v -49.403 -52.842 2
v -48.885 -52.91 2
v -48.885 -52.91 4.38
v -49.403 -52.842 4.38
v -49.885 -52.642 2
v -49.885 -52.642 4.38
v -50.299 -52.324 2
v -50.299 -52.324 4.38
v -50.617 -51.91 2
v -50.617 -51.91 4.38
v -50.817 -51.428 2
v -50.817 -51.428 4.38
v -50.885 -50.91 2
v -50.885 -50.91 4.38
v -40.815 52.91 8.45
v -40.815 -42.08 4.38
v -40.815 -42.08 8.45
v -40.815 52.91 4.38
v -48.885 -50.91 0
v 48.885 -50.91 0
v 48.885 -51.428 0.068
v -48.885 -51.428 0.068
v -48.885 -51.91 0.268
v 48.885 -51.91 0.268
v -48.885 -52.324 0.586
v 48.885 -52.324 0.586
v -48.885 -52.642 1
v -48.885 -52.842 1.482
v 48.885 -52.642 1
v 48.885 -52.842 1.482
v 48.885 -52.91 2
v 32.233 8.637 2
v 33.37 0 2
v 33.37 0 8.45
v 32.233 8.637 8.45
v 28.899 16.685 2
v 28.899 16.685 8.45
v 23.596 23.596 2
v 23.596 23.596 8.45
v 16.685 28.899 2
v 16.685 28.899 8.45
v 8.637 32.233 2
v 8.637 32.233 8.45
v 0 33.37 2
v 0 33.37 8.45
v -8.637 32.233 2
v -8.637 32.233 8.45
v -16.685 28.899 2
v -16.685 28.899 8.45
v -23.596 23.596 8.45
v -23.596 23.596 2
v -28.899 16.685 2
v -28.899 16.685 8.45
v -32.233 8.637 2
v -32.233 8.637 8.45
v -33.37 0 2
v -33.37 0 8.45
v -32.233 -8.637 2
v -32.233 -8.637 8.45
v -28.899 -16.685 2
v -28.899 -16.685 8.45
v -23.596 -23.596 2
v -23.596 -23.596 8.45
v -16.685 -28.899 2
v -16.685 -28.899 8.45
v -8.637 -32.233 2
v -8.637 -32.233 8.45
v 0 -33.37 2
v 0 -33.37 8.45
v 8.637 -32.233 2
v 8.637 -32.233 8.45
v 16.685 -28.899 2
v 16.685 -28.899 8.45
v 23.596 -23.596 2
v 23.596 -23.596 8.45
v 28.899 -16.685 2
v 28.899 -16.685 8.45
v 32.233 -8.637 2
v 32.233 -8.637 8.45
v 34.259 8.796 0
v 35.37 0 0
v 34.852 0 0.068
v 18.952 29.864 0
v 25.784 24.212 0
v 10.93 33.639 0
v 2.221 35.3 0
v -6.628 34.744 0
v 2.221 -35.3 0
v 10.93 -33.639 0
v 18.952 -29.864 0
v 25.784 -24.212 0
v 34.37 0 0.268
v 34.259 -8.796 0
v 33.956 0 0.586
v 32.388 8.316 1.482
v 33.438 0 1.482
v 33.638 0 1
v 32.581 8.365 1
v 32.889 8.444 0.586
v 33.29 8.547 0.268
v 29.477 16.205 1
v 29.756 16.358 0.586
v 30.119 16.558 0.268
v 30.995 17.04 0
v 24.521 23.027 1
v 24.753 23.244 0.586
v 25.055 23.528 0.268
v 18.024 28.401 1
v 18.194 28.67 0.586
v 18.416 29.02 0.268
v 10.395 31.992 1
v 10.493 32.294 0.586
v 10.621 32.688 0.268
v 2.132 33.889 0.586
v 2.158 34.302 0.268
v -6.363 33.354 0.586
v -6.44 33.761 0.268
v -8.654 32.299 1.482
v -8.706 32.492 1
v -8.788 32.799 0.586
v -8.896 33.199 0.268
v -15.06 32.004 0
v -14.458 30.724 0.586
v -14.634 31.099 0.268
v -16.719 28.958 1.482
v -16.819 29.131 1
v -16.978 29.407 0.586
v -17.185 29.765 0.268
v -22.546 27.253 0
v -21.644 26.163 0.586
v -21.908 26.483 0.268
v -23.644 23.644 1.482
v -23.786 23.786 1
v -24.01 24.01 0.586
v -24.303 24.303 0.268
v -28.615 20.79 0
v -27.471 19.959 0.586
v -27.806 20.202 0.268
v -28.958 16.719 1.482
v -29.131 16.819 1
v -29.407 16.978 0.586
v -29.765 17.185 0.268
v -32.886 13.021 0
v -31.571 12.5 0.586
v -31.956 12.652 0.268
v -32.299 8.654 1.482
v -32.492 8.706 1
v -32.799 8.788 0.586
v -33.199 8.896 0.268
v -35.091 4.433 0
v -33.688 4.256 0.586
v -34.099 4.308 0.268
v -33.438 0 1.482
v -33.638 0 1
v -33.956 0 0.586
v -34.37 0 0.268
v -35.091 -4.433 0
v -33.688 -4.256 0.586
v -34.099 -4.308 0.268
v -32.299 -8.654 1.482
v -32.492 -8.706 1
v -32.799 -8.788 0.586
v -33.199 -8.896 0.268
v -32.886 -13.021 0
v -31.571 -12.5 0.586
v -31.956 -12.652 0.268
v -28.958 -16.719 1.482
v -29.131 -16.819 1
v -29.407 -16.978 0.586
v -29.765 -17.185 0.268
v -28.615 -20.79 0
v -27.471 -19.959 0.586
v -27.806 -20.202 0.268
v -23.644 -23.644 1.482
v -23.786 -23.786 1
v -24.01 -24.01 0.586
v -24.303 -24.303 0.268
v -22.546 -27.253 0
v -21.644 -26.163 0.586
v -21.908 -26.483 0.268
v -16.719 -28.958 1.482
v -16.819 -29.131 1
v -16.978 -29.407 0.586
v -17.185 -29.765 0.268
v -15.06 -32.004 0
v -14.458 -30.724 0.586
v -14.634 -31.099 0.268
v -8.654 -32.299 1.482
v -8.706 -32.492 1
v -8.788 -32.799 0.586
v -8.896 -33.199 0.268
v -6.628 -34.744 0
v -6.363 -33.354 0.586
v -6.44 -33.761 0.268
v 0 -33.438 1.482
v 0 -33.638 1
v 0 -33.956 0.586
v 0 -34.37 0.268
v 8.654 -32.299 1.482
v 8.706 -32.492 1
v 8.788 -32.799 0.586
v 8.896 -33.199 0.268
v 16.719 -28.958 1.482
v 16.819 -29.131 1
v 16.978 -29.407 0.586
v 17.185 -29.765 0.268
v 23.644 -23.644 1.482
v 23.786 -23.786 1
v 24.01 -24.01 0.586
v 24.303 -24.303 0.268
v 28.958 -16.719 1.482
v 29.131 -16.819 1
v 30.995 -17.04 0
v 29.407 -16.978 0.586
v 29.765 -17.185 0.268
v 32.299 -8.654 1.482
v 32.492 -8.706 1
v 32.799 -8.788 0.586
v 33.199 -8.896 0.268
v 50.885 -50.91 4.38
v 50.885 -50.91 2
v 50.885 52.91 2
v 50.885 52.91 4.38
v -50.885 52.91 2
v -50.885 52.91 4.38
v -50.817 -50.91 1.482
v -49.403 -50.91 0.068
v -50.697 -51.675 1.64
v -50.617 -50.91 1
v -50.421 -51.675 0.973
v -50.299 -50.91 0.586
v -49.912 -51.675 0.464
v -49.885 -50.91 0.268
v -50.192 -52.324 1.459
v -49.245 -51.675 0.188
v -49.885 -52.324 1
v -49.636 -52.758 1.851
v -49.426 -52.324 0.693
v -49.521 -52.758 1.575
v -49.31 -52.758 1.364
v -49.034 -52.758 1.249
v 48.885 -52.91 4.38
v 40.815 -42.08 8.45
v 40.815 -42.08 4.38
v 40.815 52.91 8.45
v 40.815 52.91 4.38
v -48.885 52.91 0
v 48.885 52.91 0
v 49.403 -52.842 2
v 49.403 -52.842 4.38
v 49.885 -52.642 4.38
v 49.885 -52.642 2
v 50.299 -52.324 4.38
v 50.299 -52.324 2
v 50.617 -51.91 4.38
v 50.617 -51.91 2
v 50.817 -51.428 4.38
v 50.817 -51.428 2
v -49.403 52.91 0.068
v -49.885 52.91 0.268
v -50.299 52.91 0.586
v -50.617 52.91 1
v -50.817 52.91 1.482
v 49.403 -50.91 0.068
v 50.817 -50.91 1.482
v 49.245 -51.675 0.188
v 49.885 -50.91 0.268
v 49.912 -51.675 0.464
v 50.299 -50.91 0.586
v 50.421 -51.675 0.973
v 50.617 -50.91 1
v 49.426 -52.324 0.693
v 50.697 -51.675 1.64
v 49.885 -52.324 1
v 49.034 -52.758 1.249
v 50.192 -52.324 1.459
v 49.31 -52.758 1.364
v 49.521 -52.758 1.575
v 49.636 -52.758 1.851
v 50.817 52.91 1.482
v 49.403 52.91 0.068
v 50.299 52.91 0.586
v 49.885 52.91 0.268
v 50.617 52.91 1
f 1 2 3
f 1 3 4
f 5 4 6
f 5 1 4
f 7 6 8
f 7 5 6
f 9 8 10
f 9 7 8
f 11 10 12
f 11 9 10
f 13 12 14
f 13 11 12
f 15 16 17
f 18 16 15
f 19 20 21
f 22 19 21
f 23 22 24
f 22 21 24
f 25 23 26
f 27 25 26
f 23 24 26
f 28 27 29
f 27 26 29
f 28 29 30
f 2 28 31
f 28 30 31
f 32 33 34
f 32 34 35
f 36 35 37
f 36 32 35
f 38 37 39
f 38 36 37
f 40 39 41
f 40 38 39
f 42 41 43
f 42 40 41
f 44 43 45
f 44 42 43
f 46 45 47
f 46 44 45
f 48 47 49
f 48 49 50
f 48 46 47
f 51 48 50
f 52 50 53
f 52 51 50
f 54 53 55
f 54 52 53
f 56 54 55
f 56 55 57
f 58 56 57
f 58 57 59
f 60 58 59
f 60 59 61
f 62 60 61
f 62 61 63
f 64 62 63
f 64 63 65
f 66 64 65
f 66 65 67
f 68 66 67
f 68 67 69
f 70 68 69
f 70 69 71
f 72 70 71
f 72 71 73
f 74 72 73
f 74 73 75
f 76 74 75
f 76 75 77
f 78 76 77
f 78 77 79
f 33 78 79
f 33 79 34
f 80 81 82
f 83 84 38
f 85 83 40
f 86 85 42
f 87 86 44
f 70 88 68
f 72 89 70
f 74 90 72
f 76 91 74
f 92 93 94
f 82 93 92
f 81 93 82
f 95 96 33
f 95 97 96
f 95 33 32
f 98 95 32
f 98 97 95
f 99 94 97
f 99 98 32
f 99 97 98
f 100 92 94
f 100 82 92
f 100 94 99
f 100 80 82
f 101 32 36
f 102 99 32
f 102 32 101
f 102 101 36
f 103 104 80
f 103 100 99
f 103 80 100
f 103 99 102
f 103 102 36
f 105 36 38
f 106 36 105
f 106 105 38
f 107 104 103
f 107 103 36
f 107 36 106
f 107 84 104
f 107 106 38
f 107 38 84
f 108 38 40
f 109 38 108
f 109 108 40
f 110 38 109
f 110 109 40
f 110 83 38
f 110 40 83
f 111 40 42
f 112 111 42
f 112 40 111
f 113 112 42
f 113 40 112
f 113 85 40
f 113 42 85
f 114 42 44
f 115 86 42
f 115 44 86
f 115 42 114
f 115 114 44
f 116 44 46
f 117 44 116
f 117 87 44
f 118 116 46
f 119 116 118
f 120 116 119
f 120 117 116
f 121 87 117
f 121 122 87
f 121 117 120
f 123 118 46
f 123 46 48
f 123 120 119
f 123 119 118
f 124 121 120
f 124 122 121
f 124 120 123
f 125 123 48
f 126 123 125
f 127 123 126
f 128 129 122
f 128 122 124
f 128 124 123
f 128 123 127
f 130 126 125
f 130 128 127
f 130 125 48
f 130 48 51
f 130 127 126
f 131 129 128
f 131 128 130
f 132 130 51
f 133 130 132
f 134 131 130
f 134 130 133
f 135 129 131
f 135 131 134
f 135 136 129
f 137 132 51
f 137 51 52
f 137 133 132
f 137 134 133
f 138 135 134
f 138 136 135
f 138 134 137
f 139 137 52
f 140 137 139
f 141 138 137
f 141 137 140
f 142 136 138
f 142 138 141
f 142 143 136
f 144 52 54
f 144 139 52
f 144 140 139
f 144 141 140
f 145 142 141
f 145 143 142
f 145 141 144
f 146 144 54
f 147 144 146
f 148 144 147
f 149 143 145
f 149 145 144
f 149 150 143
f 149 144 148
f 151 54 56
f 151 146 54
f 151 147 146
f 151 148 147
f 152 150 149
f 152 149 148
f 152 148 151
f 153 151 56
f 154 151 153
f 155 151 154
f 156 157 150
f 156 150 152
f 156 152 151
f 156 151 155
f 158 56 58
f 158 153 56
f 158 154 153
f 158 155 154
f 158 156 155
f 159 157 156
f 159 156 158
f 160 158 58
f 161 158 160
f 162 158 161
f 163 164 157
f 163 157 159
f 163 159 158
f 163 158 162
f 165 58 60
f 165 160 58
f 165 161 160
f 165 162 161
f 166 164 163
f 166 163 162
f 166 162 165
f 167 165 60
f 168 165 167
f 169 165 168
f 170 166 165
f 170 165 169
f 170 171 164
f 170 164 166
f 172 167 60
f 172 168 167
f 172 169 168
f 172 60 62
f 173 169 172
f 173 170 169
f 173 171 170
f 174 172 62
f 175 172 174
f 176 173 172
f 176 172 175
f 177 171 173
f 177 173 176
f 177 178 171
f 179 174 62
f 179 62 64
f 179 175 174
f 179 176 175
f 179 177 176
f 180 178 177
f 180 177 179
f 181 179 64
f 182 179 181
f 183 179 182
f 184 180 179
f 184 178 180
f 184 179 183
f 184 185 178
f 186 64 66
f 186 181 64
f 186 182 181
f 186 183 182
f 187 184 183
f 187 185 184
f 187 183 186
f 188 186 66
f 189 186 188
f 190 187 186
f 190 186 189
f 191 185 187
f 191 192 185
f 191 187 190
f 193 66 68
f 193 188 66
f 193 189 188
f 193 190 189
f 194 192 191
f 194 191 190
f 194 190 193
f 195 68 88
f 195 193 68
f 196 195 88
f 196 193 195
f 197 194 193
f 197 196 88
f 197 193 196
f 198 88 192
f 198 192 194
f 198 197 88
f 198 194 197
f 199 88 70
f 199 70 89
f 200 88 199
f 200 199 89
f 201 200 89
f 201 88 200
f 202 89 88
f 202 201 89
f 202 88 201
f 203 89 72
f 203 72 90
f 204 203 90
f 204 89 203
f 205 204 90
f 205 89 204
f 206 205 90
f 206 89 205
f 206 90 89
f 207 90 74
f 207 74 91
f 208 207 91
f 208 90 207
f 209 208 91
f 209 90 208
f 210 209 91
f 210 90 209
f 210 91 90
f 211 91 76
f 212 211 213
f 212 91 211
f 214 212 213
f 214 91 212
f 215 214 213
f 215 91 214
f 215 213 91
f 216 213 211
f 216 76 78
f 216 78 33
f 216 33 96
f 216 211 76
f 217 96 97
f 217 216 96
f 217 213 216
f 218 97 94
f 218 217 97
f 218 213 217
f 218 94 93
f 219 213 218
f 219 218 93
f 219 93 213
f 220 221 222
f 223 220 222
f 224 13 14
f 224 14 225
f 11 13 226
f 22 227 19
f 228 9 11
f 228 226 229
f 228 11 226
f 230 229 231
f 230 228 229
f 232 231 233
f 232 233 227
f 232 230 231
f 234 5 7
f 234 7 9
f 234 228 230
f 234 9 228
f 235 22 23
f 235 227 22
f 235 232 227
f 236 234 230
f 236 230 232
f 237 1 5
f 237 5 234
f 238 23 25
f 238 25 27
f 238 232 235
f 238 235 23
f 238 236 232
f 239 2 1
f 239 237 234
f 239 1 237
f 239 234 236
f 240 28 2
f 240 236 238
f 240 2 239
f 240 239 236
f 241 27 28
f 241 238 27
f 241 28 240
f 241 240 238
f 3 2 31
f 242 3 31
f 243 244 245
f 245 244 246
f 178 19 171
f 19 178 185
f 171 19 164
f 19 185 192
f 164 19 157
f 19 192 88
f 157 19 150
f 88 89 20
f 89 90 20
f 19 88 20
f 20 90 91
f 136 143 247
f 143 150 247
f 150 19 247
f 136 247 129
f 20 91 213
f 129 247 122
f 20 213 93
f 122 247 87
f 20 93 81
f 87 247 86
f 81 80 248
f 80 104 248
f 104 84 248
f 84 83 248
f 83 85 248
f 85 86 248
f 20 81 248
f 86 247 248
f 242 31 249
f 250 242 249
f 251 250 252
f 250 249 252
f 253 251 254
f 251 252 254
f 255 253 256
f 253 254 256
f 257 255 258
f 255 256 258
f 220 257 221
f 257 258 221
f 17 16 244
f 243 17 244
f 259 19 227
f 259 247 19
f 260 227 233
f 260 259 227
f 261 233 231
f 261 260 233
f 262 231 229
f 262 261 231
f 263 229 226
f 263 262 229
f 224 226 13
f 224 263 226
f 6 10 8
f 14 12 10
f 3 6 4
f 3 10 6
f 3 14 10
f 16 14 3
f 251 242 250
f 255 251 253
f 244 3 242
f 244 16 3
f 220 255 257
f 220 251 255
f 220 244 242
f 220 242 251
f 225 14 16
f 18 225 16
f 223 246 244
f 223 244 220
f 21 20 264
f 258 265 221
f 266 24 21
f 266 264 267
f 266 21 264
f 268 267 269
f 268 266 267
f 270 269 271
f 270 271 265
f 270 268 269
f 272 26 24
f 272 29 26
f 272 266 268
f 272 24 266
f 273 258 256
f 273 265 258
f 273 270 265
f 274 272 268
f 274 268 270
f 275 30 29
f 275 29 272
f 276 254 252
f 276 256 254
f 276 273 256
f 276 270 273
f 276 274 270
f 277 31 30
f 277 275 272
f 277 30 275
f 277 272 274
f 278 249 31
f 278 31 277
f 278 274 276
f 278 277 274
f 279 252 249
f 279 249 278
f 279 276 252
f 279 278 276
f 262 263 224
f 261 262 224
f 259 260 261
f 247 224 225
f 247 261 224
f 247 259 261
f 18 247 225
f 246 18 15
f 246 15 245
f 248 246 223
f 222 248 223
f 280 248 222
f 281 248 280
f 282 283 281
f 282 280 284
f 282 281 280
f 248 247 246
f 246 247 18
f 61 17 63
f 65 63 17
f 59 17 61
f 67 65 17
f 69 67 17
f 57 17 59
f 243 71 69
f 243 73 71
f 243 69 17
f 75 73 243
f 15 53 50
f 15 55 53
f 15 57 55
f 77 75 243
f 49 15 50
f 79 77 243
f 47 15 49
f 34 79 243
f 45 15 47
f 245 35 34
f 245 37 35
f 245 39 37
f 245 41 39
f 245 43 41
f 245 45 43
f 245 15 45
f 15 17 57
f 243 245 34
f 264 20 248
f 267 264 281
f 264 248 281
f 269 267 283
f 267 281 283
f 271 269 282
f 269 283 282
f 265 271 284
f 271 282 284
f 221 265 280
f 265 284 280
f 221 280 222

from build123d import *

# Parameters (mm, degrees)
F0_W         = 101.77
F0_H         = 105.82
F0_R         = 33.37
F1_DEPTH     = 4.38
F2_W         = 81.63
F2_H         = 94.99
F2_R         = 33.37
F3_DEPTH     = 4.07
F4_R         = 2
F5_T1_DEPTH  = 7.38
F5_S5_W      = 2
F5_S5_H      = 2
F5_T6_DEPTH  = 2
F5_S11_W     = 2
F5_S11_H     = 2
F5_T12_DEPTH = 2


# Not quite as in the source:
# - a fillet or chamfer that OpenCascade refuses, or shapes differently, is made with other operations: its cross-section is extruded or revolved along the edge and cut away or added


with BuildPart() as f1:
    # F0 (on Top) → F1 (new body)
    with BuildSketch(Plane.XY):
        Rectangle(F0_W, F0_H)
        Circle(F0_R, mode=Mode.SUBTRACT)
    extrude(amount=F1_DEPTH)

    # F2 (on face) → F3 (join)
    with BuildSketch(Plane.XY.offset(4.38)):
        with Locations((0, 5.415)):
            Rectangle(F2_W, F2_H)
        Circle(F2_R, mode=Mode.SUBTRACT)
    extrude(amount=F3_DEPTH)

    # F4
    f4_edges = [f1.edges().sort_by_distance(p)[0] for p in [
        (-33.37, 0, 0),
        (-50.885, 0, 0),
        (0, -52.91, 0),
        (50.885, 0, 0),
    ]]
    fillet(f4_edges, radius=F4_R)

    # F5: fillet of radius 2 on 2 edges, made by hand

    # F5_s2 → F5_t1 (cut)
    with BuildSketch(Plane.XY.offset(2)):
        with BuildLine():
            ThreePointArc((48.885, -52.91), (50.2992135624, -52.3242135624), (50.885, -50.91))
            Line((50.885, -50.91), (50.885, -52.91))
            Line((50.885, -52.91), (48.885, -52.91))
        make_face()
        with BuildLine():
            ThreePointArc((-48.885, -52.91), (-50.2992135624, -52.3242135624), (-50.885, -50.91))
            Line((-50.885, -50.91), (-50.885, -52.91))
            Line((-50.885, -52.91), (-48.885, -52.91))
        make_face()
    extrude(amount=F5_T1_DEPTH, mode=Mode.SUBTRACT)


with BuildPart() as f5_tool4:
    # F5_s5 → F5_t6 (new body)
    with BuildSketch(Plane.XZ.offset(50.91)):
        with Locations((-49.885, 1)):
            Rectangle(F5_S5_W, F5_S5_H)
    extrude(amount=F5_T6_DEPTH)

    # F5_s7 → F5_t8 (revolve, cut)
    with BuildSketch(Plane(origin=(-48.885, -50.91, 2), x_dir=(0.7071067812, 0, 0.7071067812), z_dir=(0.7071067812, 0, -0.7071067812))):
        with BuildLine():
            ThreePointArc((0, -2), (2, 0), (0, 2))
            Line((0, 2), (0, -2))
        make_face()
    revolve(axis=Axis((-48.885, -50.91, 2), (0, -1, 0)), mode=Mode.SUBTRACT)


with BuildPart() as f1_1:
    add(f1.part)

    # F5_t3: cut F5_tool4
    add(f5_tool4.part, mode=Mode.SUBTRACT)


with BuildPart() as f5_tool10:
    # F5_s11 → F5_t12 (new body)
    with BuildSketch(Plane.XZ.offset(50.91)):
        with Locations((49.885, 1)):
            Rectangle(F5_S11_W, F5_S11_H)
    extrude(amount=F5_T12_DEPTH)

    # F5_s13 → F5_t14 (revolve, cut)
    with BuildSketch(Plane(origin=(48.885, -50.91, 2), x_dir=(-0.7071067812, 0, 0.7071067812), z_dir=(0.7071067812, 0, 0.7071067812))):
        with BuildLine():
            ThreePointArc((0, -2), (2, 0), (0, 2))
            Line((0, 2), (0, -2))
        make_face()
    revolve(axis=Axis((48.885, -50.91, 2), (0, -1, 0)), mode=Mode.SUBTRACT)


with BuildPart() as f1_2:
    add(f1_1.part)

    # F5_t9: cut F5_tool10
    add(f5_tool10.part, mode=Mode.SUBTRACT)


solid = f1_2.part
